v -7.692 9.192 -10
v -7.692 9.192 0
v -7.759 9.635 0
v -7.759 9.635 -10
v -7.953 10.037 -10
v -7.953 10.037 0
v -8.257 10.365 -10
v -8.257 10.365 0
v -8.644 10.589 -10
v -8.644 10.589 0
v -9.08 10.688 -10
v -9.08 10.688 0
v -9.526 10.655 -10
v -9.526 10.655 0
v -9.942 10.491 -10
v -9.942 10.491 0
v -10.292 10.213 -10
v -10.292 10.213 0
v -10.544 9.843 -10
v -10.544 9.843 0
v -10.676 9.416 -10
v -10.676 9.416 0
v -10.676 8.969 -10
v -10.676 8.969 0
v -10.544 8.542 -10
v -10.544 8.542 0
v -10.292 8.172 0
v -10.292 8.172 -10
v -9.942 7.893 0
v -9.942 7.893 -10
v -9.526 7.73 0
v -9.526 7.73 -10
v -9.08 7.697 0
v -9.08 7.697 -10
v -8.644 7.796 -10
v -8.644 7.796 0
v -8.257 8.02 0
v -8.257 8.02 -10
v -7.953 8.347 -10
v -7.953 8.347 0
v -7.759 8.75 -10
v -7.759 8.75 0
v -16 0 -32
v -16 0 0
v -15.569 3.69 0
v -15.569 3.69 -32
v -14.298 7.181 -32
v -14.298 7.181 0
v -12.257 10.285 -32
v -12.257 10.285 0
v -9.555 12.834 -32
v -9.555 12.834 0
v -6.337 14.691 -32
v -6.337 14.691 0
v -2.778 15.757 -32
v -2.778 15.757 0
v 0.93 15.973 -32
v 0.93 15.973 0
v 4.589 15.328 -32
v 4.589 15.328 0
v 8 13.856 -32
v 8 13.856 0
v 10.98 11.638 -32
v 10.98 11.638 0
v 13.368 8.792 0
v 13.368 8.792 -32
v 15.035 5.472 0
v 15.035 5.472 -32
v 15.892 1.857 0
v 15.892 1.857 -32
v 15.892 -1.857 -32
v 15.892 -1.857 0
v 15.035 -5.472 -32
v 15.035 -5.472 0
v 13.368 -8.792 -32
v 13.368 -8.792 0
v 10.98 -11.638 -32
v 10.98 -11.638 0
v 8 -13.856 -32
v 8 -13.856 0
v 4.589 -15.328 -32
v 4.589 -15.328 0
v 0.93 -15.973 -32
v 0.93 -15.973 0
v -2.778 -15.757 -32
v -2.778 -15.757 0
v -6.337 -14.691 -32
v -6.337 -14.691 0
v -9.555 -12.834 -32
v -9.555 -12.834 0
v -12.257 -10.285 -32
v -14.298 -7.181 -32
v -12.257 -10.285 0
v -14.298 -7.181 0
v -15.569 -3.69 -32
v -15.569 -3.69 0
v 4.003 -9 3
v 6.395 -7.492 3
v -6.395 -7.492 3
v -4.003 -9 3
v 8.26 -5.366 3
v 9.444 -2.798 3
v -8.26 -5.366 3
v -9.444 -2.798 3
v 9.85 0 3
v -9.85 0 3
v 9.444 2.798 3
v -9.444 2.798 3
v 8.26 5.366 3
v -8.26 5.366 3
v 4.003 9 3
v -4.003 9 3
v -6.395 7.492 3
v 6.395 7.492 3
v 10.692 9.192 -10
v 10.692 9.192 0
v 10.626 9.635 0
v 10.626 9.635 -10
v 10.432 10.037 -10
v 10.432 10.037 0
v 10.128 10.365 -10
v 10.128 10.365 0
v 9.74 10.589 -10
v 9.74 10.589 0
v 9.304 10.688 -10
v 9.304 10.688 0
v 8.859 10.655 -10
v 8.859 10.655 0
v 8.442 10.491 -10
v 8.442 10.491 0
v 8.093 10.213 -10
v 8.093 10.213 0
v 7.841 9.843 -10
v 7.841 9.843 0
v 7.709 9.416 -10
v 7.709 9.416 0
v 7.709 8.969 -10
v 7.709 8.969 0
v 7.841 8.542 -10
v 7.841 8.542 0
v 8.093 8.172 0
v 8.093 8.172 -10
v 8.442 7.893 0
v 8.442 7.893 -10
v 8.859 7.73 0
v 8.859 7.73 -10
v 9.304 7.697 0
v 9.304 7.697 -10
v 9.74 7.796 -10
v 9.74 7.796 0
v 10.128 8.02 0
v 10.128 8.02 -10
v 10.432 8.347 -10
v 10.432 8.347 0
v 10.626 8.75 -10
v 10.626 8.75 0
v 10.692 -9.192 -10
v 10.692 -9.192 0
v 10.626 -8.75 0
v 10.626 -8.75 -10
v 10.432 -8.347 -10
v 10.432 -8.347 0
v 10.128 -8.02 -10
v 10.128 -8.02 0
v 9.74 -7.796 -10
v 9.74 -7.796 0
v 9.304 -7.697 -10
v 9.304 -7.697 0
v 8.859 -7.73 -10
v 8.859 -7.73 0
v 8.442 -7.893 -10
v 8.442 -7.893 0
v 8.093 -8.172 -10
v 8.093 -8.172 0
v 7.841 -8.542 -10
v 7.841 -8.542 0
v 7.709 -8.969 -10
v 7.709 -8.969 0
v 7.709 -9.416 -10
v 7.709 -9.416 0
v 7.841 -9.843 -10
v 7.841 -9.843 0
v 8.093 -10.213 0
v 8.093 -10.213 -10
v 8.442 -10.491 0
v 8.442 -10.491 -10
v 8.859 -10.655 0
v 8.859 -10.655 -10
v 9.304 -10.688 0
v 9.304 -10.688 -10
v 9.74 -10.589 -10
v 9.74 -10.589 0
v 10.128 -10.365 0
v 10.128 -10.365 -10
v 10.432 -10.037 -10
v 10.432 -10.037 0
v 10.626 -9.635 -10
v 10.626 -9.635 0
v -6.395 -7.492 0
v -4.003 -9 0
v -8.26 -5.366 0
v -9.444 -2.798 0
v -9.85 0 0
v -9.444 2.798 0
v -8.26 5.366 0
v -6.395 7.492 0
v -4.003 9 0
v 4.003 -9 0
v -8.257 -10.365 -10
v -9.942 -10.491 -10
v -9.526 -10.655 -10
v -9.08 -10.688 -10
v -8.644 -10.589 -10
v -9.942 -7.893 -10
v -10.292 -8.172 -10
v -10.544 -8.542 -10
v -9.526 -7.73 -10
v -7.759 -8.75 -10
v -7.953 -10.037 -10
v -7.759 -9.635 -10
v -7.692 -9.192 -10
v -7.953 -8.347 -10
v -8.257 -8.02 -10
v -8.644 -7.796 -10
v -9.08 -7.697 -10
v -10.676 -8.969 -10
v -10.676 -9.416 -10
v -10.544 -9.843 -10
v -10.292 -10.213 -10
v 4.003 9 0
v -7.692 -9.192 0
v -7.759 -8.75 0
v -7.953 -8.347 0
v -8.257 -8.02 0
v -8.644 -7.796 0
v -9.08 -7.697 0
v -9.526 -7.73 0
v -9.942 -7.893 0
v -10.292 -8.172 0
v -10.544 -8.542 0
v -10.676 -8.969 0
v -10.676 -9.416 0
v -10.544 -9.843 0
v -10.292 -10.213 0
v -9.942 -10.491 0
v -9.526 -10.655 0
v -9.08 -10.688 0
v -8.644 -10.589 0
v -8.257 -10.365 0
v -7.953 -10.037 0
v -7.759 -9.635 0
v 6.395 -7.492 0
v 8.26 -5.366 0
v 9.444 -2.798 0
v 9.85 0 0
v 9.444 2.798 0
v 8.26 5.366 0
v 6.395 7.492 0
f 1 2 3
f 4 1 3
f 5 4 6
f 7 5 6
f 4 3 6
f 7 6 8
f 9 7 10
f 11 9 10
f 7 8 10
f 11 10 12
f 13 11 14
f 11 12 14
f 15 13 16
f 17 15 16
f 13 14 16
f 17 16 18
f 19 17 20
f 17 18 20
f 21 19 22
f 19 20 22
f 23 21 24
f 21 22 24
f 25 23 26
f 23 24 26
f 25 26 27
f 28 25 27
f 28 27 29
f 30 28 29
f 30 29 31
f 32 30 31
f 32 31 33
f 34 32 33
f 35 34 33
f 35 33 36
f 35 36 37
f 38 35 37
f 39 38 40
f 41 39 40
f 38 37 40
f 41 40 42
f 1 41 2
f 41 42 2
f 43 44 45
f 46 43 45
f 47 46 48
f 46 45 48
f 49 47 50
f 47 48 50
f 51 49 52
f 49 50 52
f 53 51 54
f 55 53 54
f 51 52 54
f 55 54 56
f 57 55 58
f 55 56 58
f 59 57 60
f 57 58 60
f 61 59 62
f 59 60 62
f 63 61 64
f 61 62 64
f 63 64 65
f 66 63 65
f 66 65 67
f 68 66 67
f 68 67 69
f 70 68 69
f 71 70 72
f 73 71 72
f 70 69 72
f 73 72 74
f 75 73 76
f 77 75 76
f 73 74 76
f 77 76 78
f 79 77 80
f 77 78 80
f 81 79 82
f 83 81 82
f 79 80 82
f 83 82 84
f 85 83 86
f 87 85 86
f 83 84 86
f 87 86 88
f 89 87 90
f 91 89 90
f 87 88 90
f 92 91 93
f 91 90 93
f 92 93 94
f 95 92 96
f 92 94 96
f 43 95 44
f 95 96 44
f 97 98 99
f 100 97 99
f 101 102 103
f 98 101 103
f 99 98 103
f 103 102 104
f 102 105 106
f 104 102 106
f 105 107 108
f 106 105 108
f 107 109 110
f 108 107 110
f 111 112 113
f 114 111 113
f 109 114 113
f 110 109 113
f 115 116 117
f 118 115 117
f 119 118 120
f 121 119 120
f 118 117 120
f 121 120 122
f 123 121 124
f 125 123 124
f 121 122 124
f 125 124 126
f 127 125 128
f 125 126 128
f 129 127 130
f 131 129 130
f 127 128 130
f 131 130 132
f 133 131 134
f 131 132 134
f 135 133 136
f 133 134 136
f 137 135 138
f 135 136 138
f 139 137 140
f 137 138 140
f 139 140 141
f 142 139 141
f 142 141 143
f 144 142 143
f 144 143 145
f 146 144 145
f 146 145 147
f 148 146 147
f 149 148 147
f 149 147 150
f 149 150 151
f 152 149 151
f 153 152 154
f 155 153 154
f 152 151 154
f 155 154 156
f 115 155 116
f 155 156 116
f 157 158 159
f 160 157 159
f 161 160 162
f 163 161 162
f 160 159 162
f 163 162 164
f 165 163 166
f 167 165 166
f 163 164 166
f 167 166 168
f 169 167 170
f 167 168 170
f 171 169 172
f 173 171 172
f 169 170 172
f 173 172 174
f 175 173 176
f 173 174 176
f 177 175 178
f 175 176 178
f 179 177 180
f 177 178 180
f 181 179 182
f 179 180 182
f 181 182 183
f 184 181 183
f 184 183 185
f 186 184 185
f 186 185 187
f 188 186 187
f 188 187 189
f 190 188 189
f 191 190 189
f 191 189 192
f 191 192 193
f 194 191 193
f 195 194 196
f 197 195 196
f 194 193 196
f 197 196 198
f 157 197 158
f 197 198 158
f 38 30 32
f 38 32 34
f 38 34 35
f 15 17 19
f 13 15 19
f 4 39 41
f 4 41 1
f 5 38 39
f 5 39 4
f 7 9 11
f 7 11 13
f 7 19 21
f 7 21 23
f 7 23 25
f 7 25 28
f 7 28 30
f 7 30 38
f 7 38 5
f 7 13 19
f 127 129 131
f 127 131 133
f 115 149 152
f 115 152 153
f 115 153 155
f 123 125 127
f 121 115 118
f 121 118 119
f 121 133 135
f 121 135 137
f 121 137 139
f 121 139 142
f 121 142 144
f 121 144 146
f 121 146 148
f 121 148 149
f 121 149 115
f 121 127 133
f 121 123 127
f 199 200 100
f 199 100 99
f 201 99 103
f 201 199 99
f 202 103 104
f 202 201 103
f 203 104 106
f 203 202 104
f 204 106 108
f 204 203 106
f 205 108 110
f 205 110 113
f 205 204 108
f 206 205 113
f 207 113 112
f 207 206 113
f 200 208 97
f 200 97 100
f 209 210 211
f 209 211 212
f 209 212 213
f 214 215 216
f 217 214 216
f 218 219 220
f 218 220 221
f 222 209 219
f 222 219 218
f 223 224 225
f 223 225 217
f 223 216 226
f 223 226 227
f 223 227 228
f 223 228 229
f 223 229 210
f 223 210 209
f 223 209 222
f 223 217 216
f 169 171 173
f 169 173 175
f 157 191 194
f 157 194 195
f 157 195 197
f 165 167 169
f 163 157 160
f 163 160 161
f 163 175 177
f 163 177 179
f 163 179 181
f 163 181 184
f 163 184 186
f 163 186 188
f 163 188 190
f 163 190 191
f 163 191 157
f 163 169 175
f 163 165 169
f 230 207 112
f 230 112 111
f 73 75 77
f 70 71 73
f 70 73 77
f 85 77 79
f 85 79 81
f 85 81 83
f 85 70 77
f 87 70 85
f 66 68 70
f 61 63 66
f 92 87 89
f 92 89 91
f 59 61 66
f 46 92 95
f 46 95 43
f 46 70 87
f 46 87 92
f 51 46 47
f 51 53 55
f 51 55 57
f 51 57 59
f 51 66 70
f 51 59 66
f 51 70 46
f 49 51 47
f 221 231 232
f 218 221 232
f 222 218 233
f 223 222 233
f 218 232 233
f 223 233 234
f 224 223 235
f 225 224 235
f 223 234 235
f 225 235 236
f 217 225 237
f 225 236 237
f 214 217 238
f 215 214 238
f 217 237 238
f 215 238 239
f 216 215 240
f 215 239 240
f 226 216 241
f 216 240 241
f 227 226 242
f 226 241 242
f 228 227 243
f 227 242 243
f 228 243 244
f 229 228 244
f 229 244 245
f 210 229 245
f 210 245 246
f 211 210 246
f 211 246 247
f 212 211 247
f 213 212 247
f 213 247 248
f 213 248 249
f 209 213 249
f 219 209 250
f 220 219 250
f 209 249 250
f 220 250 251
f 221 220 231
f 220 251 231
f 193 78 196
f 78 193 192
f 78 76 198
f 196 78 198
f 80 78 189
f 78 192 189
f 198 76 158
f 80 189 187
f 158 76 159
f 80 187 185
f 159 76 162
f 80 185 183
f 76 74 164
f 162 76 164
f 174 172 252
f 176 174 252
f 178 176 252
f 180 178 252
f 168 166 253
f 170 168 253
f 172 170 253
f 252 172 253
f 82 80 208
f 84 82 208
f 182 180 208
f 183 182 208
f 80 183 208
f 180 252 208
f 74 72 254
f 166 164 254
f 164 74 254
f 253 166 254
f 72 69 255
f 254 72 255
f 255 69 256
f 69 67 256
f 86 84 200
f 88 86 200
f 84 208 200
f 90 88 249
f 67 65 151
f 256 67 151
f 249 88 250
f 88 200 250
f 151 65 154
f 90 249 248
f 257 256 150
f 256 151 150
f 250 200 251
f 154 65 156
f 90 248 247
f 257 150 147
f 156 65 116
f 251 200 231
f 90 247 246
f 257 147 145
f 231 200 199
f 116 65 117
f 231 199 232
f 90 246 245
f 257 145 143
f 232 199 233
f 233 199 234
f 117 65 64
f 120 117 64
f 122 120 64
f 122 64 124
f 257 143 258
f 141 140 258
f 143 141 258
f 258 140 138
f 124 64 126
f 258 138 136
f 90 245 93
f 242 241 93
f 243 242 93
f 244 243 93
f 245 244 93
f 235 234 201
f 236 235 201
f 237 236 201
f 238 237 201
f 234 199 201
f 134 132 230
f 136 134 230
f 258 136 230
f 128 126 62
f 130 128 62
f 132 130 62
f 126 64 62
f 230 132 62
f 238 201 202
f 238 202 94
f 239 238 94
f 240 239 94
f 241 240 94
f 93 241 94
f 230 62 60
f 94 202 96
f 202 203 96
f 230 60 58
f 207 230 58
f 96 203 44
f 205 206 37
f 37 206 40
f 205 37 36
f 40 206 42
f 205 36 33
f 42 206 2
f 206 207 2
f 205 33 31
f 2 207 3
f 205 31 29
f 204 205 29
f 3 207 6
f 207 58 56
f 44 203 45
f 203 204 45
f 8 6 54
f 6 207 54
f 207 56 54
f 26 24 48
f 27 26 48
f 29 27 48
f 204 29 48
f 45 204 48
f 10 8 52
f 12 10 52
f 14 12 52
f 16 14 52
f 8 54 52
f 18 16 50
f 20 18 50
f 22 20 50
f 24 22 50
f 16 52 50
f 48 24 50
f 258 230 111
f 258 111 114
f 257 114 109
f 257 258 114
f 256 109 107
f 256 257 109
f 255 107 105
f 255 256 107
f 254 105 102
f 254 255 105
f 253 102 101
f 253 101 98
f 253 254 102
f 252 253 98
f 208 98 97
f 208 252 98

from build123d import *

# Parameters (mm, degrees)
BOSS_EXTRUDE1_DEPTH = 3
SKETCH2_R           = 16
BOSS_EXTRUDE2_DEPTH = 32
SKETCH6_R           = 1.5
CUT_EXTRUDE1_DEPTH  = 10


with BuildPart() as part:
    # Sketch1 → Boss-Extrude1 (new body)
    with BuildSketch(Plane.XY):
        with BuildLine():
            Line((-4.002811512, 9), (4.002811512, 9))
            ThreePointArc((4.002811512, 9), (9.85, 0), (4.002811512, -9))
            Line((4.002811512, -9), (-4.002811512, -9))
            ThreePointArc((-4.002811512, -9), (-9.85, 0), (-4.002811512, 9))
        make_face()
    extrude(amount=BOSS_EXTRUDE1_DEPTH)

    # Sketch2 → Boss-Extrude2 (add)
    with BuildSketch(Plane(origin=(0, 0, 0), x_dir=(-1, 0, 0), z_dir=(0, 0, -1))):
        Circle(SKETCH2_R)
    extrude(amount=BOSS_EXTRUDE2_DEPTH)

    # Sketch6 → Cut-Extrude1 (cut)
    with BuildSketch(Plane.XY):
        with Locations((-9.192388155, 9.192388155)):
            Circle(SKETCH6_R)
        with Locations((9.192388155, 9.192388155)):
            Circle(SKETCH6_R)
        with Locations((9.192388155, -9.192388155)):
            Circle(SKETCH6_R)
        with Locations((-9.192388155, -9.192388155)):
            Circle(SKETCH6_R)
    extrude(amount=-CUT_EXTRUDE1_DEPTH, mode=Mode.SUBTRACT)


solid = part.part
